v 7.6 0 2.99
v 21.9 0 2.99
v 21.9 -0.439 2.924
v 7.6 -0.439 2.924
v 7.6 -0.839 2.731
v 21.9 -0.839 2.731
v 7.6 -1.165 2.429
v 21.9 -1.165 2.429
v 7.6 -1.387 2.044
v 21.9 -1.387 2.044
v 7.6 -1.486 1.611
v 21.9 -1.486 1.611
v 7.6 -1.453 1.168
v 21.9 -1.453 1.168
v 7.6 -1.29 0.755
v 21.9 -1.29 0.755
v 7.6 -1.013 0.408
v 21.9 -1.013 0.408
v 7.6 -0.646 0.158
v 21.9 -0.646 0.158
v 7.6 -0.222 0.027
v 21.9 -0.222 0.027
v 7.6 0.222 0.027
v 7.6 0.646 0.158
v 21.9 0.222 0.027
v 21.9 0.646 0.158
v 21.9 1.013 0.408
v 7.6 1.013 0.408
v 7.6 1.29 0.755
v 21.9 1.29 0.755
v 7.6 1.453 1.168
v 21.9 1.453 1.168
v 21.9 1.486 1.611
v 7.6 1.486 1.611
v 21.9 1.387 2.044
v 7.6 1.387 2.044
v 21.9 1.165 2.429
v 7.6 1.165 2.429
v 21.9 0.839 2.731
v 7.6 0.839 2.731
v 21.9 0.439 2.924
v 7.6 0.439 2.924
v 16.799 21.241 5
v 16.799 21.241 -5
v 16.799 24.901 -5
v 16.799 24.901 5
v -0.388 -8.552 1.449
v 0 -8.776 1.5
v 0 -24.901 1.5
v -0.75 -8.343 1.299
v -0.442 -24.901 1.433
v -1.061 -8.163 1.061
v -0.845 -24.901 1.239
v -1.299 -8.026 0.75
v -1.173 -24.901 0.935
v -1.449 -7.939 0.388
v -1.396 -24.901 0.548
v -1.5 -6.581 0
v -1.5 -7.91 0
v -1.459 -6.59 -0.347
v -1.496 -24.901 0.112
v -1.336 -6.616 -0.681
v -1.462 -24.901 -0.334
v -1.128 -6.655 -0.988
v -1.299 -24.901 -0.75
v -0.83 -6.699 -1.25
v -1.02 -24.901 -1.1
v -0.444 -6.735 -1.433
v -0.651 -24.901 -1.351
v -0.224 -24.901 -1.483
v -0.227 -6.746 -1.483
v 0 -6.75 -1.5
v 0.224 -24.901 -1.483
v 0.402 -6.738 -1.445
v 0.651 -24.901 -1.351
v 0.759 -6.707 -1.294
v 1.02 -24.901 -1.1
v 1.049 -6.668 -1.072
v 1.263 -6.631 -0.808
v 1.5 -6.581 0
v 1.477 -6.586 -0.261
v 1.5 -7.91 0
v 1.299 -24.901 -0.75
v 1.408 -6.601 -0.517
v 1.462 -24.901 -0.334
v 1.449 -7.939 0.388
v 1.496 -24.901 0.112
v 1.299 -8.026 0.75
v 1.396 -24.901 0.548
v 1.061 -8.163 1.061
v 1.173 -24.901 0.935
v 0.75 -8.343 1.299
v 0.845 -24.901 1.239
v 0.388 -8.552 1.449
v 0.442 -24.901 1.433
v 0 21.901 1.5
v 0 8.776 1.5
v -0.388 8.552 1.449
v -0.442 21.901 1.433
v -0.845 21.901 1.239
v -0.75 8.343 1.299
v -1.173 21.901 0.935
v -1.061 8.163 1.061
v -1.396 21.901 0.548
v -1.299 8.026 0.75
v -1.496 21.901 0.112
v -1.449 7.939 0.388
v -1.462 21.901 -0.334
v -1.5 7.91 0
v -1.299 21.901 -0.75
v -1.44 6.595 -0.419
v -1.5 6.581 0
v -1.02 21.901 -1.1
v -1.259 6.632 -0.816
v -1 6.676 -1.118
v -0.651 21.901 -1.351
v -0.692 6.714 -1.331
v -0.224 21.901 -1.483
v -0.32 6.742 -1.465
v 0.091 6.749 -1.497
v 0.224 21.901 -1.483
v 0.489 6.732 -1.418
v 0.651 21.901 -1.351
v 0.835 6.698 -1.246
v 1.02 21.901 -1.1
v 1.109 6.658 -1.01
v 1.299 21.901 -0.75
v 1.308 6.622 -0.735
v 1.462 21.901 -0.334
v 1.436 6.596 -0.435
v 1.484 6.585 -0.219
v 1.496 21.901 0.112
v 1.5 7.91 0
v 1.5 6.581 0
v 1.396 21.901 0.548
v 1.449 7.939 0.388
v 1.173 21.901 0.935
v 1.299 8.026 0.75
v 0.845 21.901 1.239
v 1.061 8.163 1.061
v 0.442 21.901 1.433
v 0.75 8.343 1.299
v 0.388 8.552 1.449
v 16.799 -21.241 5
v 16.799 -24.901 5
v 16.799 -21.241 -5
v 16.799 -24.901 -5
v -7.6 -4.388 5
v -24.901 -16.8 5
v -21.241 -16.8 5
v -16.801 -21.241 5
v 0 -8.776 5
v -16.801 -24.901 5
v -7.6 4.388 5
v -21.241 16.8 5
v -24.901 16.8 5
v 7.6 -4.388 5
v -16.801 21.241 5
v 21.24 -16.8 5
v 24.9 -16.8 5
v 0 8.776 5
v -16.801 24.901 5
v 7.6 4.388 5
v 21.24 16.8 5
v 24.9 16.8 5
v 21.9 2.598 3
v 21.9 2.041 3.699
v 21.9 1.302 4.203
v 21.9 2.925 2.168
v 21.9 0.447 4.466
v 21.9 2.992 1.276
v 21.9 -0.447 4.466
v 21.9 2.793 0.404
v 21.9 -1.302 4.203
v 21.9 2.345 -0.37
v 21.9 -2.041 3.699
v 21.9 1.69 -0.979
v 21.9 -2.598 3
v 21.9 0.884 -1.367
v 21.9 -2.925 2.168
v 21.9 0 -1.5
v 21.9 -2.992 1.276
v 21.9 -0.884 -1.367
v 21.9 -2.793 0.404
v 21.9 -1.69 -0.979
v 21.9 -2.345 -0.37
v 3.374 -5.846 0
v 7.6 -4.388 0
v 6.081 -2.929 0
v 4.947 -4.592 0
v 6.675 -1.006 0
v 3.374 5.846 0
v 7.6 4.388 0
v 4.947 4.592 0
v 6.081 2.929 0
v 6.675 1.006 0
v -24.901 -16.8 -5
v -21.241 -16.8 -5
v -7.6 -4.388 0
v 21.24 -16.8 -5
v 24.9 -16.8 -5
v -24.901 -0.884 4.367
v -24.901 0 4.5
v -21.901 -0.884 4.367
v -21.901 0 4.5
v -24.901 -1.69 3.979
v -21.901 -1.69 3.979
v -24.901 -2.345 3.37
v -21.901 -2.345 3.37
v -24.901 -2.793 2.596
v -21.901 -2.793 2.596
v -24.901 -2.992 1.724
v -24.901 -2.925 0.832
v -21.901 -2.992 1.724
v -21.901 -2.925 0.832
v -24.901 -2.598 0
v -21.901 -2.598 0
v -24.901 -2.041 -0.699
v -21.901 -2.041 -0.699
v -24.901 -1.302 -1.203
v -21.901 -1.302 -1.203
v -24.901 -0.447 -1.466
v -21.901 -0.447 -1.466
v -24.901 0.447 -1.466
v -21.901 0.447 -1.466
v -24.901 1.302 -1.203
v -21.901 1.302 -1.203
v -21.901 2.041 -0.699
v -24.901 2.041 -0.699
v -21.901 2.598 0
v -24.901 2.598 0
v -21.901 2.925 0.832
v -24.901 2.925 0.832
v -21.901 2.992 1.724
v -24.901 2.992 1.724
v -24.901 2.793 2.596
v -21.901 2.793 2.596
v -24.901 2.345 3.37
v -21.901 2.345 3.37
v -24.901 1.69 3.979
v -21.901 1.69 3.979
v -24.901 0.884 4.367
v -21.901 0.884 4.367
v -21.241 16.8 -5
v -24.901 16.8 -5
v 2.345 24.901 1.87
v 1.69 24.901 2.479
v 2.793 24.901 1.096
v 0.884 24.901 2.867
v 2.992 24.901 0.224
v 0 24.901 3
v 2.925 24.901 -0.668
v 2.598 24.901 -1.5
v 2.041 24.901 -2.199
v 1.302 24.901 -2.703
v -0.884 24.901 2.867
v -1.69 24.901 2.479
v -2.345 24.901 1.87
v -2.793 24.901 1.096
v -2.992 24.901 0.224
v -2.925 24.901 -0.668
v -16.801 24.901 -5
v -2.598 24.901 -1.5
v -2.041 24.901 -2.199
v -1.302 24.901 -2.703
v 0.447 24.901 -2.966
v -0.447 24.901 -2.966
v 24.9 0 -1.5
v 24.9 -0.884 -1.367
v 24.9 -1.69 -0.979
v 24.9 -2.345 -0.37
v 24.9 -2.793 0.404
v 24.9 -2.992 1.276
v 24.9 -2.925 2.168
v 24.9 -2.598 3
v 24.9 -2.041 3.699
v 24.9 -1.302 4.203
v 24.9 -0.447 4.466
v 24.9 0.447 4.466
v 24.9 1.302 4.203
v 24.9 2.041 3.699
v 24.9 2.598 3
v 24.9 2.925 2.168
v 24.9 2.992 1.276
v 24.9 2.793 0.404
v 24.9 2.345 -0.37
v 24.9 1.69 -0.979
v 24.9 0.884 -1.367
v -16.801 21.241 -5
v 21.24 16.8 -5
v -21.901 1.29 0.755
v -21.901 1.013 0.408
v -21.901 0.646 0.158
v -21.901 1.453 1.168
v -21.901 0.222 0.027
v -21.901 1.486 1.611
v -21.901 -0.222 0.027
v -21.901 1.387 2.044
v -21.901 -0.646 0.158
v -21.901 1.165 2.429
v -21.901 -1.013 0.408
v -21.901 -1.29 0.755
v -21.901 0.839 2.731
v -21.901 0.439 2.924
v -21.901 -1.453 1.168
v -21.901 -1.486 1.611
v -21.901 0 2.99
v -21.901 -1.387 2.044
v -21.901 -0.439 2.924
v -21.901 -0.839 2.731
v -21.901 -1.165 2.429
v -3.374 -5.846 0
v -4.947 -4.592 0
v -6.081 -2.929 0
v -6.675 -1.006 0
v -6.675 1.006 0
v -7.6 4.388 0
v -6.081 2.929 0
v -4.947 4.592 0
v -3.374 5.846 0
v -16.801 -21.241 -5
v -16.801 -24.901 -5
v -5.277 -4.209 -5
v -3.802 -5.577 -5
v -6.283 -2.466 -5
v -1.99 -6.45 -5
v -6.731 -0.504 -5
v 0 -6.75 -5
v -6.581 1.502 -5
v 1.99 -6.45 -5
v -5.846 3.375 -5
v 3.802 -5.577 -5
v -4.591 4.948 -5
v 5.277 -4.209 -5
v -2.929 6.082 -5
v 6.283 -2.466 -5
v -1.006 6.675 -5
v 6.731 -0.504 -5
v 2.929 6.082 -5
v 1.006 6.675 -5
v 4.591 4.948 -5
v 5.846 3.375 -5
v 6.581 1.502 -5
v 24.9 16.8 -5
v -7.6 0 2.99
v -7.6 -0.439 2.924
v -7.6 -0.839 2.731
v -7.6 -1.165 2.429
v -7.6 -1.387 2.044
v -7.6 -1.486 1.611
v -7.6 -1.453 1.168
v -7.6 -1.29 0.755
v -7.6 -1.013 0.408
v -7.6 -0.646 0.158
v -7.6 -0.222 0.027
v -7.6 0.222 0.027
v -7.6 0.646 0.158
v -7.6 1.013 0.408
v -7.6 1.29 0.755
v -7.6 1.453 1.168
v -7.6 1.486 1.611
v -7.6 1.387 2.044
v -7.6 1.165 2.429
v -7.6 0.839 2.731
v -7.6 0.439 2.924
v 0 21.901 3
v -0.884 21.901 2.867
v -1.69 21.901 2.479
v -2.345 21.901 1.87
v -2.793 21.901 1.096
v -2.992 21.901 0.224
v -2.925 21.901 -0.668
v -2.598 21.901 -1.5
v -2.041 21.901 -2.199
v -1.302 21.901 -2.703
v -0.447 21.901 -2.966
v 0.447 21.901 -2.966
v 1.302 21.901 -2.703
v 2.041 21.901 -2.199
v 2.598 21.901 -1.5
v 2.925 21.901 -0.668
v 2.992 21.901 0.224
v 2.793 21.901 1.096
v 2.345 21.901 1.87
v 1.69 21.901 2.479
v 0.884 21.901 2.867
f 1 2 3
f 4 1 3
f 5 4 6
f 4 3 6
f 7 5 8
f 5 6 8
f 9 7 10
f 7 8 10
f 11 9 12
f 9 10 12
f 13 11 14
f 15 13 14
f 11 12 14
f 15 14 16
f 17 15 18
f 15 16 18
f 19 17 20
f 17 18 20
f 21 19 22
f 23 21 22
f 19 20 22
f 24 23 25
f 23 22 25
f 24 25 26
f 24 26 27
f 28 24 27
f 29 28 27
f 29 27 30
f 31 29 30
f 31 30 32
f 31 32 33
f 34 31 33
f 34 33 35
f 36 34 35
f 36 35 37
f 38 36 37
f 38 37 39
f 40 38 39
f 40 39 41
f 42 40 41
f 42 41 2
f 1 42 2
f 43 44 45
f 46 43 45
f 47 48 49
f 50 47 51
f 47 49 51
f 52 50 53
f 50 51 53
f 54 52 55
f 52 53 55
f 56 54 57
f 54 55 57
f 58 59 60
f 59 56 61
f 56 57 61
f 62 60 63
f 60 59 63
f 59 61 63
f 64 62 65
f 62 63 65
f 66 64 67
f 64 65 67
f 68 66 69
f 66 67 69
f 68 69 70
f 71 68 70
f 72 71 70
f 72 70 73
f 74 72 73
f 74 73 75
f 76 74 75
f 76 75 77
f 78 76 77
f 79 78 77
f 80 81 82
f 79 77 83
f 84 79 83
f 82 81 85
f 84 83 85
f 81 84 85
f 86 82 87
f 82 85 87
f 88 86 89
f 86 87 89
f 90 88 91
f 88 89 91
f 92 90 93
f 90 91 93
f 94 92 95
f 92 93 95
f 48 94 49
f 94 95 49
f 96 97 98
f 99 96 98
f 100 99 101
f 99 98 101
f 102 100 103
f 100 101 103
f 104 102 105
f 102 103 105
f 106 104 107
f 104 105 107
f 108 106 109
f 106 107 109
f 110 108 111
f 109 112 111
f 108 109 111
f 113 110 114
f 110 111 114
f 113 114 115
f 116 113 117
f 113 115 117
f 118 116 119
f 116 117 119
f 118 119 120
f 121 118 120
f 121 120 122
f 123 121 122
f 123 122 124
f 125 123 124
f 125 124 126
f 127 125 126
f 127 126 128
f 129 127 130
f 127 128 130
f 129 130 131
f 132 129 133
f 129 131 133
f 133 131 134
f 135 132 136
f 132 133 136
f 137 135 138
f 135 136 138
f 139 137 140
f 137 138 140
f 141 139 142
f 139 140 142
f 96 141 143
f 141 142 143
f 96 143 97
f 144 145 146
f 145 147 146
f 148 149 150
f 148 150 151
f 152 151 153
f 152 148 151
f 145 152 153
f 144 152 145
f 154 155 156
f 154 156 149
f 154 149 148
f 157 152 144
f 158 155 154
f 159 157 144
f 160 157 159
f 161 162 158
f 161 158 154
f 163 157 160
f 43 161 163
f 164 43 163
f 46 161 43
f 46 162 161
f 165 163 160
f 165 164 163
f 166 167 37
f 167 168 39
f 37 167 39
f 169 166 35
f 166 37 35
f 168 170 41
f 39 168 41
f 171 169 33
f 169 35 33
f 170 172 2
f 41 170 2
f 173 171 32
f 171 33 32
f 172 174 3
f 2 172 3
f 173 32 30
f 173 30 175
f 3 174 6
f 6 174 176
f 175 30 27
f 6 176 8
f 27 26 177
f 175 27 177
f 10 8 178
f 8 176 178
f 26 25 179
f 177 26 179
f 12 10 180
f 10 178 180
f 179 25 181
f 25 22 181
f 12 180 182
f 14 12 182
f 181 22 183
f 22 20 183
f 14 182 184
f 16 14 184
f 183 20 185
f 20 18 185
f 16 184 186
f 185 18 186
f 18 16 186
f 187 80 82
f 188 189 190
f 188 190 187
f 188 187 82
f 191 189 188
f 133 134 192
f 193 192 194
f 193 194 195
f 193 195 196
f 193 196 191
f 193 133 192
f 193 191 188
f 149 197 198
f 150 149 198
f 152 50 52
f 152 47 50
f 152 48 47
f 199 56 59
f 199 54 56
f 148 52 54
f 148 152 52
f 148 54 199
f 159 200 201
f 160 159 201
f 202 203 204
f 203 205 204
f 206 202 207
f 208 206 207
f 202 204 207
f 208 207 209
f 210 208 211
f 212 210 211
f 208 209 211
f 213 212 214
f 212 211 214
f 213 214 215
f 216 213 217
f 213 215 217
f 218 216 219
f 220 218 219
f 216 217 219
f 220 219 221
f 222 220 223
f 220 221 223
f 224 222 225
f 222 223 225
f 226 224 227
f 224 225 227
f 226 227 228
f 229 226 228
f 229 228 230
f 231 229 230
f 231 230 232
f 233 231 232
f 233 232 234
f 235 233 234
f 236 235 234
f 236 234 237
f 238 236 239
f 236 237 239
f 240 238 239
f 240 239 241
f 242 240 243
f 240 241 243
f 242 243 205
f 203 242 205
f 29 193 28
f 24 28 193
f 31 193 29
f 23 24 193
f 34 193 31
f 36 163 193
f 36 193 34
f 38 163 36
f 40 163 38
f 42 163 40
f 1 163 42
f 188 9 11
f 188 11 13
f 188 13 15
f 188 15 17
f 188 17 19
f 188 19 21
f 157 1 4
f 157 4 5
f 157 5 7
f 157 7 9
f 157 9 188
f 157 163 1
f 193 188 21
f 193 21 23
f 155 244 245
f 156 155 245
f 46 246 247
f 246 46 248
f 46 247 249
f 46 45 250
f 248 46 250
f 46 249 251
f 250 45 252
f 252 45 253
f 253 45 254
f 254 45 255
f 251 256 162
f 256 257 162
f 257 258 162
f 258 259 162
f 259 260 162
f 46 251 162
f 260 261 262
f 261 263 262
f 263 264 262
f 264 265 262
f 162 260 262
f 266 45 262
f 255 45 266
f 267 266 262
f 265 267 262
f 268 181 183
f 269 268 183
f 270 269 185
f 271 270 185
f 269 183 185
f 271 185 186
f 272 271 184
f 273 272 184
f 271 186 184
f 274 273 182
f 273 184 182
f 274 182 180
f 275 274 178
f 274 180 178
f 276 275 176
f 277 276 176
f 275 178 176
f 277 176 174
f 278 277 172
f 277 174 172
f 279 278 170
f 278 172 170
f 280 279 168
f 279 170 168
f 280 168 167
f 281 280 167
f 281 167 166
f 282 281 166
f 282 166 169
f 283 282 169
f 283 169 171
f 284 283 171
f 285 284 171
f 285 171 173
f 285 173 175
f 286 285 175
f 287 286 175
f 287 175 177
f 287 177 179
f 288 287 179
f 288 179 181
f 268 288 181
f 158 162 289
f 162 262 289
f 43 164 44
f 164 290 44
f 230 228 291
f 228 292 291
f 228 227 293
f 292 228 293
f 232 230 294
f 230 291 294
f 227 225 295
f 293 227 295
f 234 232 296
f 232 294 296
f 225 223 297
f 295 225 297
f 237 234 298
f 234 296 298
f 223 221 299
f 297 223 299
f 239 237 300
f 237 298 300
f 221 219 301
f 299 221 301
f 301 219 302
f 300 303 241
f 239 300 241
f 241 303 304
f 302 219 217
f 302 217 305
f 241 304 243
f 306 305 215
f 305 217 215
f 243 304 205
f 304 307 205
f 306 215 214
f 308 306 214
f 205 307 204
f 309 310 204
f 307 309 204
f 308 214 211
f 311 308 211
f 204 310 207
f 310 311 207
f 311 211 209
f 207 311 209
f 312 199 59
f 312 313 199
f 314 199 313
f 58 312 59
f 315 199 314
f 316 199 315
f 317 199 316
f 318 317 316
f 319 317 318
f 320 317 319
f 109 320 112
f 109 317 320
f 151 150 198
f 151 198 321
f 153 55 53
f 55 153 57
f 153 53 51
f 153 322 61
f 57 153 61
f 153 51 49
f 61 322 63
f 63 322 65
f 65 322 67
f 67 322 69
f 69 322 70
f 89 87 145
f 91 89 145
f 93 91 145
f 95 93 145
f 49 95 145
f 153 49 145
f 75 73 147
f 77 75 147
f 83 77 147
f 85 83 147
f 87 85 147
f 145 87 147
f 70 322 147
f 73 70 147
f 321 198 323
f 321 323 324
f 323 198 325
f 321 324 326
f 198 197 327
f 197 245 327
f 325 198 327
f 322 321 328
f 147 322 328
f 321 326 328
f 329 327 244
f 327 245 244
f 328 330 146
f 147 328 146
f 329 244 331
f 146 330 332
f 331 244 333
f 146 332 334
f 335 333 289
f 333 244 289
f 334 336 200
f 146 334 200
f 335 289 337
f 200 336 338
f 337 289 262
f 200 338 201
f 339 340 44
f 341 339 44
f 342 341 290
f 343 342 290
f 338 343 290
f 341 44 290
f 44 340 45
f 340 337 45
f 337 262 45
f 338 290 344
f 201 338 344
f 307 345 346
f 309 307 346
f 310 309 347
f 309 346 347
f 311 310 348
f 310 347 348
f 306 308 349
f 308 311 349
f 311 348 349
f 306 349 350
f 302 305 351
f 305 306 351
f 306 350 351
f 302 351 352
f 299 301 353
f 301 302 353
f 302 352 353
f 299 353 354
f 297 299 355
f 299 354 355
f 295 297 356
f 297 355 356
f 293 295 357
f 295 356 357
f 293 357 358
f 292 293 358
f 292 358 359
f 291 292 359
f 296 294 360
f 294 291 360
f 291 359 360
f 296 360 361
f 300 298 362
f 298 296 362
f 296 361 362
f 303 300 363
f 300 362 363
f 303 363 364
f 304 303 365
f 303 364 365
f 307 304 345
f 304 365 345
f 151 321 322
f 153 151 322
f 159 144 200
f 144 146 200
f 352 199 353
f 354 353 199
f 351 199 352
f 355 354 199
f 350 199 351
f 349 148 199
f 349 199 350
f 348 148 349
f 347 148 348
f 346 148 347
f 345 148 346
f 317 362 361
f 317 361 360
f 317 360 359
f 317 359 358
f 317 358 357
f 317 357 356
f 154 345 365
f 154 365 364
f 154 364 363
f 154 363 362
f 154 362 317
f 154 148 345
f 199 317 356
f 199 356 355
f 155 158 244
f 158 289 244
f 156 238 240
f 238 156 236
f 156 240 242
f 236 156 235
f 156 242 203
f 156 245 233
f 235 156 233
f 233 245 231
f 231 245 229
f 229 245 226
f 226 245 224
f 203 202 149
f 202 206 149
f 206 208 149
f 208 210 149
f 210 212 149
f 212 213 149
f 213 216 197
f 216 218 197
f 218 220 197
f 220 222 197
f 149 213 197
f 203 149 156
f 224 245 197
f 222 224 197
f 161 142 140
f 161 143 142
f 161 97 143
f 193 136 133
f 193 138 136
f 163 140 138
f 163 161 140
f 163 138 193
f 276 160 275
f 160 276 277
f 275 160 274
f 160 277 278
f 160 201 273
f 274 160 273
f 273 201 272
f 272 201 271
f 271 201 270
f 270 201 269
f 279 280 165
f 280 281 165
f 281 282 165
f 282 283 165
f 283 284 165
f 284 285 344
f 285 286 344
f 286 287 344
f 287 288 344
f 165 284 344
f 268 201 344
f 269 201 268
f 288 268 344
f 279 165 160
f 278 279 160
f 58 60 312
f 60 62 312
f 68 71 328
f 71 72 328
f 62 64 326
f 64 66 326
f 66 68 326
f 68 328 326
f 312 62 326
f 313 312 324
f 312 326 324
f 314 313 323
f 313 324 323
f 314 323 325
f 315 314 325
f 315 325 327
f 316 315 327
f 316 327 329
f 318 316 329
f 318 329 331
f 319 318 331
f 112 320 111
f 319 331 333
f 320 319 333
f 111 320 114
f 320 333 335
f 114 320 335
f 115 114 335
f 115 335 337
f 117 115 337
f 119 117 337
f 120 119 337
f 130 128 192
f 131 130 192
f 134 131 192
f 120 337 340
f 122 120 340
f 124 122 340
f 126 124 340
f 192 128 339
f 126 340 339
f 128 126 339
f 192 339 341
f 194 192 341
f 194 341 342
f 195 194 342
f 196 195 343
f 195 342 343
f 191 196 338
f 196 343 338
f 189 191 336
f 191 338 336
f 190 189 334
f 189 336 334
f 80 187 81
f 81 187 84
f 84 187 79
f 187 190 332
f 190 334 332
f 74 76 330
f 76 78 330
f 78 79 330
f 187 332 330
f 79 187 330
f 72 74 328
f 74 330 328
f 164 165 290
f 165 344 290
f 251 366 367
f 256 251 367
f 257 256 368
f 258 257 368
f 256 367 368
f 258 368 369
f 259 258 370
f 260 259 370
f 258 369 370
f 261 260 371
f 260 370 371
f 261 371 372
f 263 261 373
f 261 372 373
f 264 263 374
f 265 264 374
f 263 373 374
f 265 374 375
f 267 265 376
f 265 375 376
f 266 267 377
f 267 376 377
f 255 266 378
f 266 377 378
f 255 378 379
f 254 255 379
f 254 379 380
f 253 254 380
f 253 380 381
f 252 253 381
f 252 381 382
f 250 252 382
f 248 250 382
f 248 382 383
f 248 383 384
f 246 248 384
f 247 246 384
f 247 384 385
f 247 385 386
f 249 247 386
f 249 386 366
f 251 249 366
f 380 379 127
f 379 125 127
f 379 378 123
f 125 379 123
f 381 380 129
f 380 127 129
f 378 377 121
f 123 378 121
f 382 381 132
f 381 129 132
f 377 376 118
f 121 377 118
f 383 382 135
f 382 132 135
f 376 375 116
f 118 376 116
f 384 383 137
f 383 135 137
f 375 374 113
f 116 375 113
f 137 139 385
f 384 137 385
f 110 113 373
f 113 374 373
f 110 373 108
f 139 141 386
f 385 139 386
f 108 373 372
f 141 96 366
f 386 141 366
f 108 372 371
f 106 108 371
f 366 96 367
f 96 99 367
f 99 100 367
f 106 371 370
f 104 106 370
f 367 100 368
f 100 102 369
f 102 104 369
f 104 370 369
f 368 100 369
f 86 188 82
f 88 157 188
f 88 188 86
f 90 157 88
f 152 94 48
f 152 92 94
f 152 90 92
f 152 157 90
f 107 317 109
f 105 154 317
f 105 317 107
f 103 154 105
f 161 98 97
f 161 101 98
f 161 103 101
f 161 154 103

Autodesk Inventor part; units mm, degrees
ref_plane "YZ Plane" through (0, 0, 0) normal (1, 0, 0) x (0, 1, 0)
ref_plane "XZ Plane" through (0, 0, 0) normal (0, 1, 0) x (-1, 0, 0)
ref_plane "XY Plane" through (0, 0, 0) normal (0, 0, 1) x (1, 0, 0)
sketch "草图1" plane through (0, 0, 0) normal (0, 0, 1) x (1, 0, 0)
  line L0 (24.9, 0) -> (24.9, 16.8)
  line L1 (24.9, 0) -> (41.7, 0) construction
  line L2 (24.9, 16.8) -> (21.24, 16.8)
  line L3 (21.24, 16.8) -> (16.7994, 21.2406)
  line L4 (16.7994, 21.2406) -> (16.7994, 24.9006)
  line L5 (16.7994, 24.9006) -> (-0.0006, 24.9006)
  line L6 (-0.0006, 24.9006) -> (-16.8006, 24.9006)
  line L7 (-16.8006, 24.9006) -> (-16.8006, 21.2406)
  line L8 (-16.8006, 21.2406) -> (-21.2413, 16.8)
  line L9 (-21.2413, 16.8) -> (-24.9013, 16.8)
  line L10 (-24.9013, 16.8) -> (-24.9013, 0)
  line L11 (-24.9013, 0) -> (-24.9013, -16.8)
  line L12 (-24.9013, -16.8) -> (-21.2413, -16.8)
  line L13 (-21.2413, -16.8) -> (-16.8006, -21.2406)
  line L14 (-16.8006, -21.2406) -> (-16.8006, -24.9006)
  line L15 (-16.8006, -24.9006) -> (16.7994, -24.9006)
  line L16 (16.7994, -24.9006) -> (16.7994, -21.2406)
  line L17 (16.7994, -21.2406) -> (21.24, -16.8)
  line L18 (21.24, -16.8) -> (24.9, -16.8)
  line L19 (24.9, -16.8) -> (24.9, 0)
  line L20 (-8.7757, 0) -> (-4.3879, 7.6)
  line L21 (-4.3879, 7.6) -> (4.3879, 7.6)
  line L22 (4.3879, 7.6) -> (8.7757, 0)
  line L23 (8.7757, 0) -> (4.3879, -7.6)
  line L24 (4.3879, -7.6) -> (-4.3879, -7.6)
  line L25 (-4.3879, -7.6) -> (-8.7757, 0)
  point P0 (0, 0)
  point P1 (0, 0)
  point P2 (0, 0)
  dimension "d61" = 15.2
extrude "拉伸1" add sketch "草图1" along normal blind 5 and the other way blind 5 contours L19 L18 L17 L16 L15 L14 L13 L12 L11 L10 L9 L8 L7 L6 L5 L4 L3 L2 L0 | L20 L21 L22 L23 L24 L25
sketch "草图2" plane through (0, 0, 5) normal (0, 0, 1) x (1, 0, 0)
  point P0 (0, 0)
sketch "草图3" plane through (0, 0, 5) normal (0, 0, 1) x (1, 0, 0)
  point P0 (0, 0)
sketch "草图4" plane through (0, 0, 5) normal (0, 0, 1) x (1, 0, 0)
  line L0 (7.6, -4.3879) -> (0, -8.7757)
  line L1 (0, -8.7757) -> (-7.6, -4.3879)
  line L2 (-7.6, -4.3879) -> (-7.6, 4.3879)
  line L3 (-7.6, 4.3879) -> (0, 8.7757)
  line L4 (0, 8.7757) -> (7.6, 4.3879)
  line L5 (7.6, 4.3879) -> (7.6, -4.3879)
  point P0 (0, 0)
  point P1 (0, 0)
  dimension "d30" = 15.2
extrude "拉伸2" cut sketch "草图4" against normal blind 5
sketch "草图5" plane through (0, 0, 0) normal (0, 0, 1) x (1, 0, 0)
  point P0 (0, 0)
  point P1 (0, 0)
hole "孔1" at (0, 0, 0) direction (0, 0, -1) diameter 13.5 end through all
sketch "草图6" plane through (-24.9013, -16.8, 5) normal (-1, 0, 0) x (0, 0, 1)
  point P0 (-5, 16.8)
  point P1 (-3.5, 16.8)
hole "孔2" at (-24.9013, 0, 1.5) direction (1, 0, 0) diameter 2.98 end through all counterbore diameter 6 counterbore depth 3
sketch "草图7" plane through (24.9, -16.8, 5) normal (1, 0, 0) x (0, 0, -1)
  point P0 (5, 16.8)
  point P1 (3.5, 16.8)
hole "孔3" at (24.9, 0, 1.5) direction (-1, 0, 0) diameter 2.98 end through all counterbore diameter 6 counterbore depth 3
sketch "草图8" plane through (-16.8006, 24.9006, 5) normal (0, 1, 0) x (1, 0, 0)
  line L0 (24.4006, 5) -> (16.8006, 5) projected
hole "孔4" at (0, 24.9006, 0) direction (0, -1, 0) diameter 3 end through all counterbore diameter 6 counterbore depth 3
equation "\"d38\" = 厚度"
equation "\"折弯半径\" = 厚度"
equation "\"折弯释压宽度\" = 厚度"
equation "\"折弯释压深度\" = 0.5 * 厚度"
equation "\"拐角释压尺寸\" = 4 * 厚度"
equation "\"最小余量\" = 2 * 厚度"
equation "\"过渡半径\" = 折弯半径"
equation "\"Jacobi半径尺寸\" = 折弯半径"
equation "\"间隙大小\" = 厚度"
equation "\"厚度\" = 0.5"
properties part number "zhunzhiguan1"
